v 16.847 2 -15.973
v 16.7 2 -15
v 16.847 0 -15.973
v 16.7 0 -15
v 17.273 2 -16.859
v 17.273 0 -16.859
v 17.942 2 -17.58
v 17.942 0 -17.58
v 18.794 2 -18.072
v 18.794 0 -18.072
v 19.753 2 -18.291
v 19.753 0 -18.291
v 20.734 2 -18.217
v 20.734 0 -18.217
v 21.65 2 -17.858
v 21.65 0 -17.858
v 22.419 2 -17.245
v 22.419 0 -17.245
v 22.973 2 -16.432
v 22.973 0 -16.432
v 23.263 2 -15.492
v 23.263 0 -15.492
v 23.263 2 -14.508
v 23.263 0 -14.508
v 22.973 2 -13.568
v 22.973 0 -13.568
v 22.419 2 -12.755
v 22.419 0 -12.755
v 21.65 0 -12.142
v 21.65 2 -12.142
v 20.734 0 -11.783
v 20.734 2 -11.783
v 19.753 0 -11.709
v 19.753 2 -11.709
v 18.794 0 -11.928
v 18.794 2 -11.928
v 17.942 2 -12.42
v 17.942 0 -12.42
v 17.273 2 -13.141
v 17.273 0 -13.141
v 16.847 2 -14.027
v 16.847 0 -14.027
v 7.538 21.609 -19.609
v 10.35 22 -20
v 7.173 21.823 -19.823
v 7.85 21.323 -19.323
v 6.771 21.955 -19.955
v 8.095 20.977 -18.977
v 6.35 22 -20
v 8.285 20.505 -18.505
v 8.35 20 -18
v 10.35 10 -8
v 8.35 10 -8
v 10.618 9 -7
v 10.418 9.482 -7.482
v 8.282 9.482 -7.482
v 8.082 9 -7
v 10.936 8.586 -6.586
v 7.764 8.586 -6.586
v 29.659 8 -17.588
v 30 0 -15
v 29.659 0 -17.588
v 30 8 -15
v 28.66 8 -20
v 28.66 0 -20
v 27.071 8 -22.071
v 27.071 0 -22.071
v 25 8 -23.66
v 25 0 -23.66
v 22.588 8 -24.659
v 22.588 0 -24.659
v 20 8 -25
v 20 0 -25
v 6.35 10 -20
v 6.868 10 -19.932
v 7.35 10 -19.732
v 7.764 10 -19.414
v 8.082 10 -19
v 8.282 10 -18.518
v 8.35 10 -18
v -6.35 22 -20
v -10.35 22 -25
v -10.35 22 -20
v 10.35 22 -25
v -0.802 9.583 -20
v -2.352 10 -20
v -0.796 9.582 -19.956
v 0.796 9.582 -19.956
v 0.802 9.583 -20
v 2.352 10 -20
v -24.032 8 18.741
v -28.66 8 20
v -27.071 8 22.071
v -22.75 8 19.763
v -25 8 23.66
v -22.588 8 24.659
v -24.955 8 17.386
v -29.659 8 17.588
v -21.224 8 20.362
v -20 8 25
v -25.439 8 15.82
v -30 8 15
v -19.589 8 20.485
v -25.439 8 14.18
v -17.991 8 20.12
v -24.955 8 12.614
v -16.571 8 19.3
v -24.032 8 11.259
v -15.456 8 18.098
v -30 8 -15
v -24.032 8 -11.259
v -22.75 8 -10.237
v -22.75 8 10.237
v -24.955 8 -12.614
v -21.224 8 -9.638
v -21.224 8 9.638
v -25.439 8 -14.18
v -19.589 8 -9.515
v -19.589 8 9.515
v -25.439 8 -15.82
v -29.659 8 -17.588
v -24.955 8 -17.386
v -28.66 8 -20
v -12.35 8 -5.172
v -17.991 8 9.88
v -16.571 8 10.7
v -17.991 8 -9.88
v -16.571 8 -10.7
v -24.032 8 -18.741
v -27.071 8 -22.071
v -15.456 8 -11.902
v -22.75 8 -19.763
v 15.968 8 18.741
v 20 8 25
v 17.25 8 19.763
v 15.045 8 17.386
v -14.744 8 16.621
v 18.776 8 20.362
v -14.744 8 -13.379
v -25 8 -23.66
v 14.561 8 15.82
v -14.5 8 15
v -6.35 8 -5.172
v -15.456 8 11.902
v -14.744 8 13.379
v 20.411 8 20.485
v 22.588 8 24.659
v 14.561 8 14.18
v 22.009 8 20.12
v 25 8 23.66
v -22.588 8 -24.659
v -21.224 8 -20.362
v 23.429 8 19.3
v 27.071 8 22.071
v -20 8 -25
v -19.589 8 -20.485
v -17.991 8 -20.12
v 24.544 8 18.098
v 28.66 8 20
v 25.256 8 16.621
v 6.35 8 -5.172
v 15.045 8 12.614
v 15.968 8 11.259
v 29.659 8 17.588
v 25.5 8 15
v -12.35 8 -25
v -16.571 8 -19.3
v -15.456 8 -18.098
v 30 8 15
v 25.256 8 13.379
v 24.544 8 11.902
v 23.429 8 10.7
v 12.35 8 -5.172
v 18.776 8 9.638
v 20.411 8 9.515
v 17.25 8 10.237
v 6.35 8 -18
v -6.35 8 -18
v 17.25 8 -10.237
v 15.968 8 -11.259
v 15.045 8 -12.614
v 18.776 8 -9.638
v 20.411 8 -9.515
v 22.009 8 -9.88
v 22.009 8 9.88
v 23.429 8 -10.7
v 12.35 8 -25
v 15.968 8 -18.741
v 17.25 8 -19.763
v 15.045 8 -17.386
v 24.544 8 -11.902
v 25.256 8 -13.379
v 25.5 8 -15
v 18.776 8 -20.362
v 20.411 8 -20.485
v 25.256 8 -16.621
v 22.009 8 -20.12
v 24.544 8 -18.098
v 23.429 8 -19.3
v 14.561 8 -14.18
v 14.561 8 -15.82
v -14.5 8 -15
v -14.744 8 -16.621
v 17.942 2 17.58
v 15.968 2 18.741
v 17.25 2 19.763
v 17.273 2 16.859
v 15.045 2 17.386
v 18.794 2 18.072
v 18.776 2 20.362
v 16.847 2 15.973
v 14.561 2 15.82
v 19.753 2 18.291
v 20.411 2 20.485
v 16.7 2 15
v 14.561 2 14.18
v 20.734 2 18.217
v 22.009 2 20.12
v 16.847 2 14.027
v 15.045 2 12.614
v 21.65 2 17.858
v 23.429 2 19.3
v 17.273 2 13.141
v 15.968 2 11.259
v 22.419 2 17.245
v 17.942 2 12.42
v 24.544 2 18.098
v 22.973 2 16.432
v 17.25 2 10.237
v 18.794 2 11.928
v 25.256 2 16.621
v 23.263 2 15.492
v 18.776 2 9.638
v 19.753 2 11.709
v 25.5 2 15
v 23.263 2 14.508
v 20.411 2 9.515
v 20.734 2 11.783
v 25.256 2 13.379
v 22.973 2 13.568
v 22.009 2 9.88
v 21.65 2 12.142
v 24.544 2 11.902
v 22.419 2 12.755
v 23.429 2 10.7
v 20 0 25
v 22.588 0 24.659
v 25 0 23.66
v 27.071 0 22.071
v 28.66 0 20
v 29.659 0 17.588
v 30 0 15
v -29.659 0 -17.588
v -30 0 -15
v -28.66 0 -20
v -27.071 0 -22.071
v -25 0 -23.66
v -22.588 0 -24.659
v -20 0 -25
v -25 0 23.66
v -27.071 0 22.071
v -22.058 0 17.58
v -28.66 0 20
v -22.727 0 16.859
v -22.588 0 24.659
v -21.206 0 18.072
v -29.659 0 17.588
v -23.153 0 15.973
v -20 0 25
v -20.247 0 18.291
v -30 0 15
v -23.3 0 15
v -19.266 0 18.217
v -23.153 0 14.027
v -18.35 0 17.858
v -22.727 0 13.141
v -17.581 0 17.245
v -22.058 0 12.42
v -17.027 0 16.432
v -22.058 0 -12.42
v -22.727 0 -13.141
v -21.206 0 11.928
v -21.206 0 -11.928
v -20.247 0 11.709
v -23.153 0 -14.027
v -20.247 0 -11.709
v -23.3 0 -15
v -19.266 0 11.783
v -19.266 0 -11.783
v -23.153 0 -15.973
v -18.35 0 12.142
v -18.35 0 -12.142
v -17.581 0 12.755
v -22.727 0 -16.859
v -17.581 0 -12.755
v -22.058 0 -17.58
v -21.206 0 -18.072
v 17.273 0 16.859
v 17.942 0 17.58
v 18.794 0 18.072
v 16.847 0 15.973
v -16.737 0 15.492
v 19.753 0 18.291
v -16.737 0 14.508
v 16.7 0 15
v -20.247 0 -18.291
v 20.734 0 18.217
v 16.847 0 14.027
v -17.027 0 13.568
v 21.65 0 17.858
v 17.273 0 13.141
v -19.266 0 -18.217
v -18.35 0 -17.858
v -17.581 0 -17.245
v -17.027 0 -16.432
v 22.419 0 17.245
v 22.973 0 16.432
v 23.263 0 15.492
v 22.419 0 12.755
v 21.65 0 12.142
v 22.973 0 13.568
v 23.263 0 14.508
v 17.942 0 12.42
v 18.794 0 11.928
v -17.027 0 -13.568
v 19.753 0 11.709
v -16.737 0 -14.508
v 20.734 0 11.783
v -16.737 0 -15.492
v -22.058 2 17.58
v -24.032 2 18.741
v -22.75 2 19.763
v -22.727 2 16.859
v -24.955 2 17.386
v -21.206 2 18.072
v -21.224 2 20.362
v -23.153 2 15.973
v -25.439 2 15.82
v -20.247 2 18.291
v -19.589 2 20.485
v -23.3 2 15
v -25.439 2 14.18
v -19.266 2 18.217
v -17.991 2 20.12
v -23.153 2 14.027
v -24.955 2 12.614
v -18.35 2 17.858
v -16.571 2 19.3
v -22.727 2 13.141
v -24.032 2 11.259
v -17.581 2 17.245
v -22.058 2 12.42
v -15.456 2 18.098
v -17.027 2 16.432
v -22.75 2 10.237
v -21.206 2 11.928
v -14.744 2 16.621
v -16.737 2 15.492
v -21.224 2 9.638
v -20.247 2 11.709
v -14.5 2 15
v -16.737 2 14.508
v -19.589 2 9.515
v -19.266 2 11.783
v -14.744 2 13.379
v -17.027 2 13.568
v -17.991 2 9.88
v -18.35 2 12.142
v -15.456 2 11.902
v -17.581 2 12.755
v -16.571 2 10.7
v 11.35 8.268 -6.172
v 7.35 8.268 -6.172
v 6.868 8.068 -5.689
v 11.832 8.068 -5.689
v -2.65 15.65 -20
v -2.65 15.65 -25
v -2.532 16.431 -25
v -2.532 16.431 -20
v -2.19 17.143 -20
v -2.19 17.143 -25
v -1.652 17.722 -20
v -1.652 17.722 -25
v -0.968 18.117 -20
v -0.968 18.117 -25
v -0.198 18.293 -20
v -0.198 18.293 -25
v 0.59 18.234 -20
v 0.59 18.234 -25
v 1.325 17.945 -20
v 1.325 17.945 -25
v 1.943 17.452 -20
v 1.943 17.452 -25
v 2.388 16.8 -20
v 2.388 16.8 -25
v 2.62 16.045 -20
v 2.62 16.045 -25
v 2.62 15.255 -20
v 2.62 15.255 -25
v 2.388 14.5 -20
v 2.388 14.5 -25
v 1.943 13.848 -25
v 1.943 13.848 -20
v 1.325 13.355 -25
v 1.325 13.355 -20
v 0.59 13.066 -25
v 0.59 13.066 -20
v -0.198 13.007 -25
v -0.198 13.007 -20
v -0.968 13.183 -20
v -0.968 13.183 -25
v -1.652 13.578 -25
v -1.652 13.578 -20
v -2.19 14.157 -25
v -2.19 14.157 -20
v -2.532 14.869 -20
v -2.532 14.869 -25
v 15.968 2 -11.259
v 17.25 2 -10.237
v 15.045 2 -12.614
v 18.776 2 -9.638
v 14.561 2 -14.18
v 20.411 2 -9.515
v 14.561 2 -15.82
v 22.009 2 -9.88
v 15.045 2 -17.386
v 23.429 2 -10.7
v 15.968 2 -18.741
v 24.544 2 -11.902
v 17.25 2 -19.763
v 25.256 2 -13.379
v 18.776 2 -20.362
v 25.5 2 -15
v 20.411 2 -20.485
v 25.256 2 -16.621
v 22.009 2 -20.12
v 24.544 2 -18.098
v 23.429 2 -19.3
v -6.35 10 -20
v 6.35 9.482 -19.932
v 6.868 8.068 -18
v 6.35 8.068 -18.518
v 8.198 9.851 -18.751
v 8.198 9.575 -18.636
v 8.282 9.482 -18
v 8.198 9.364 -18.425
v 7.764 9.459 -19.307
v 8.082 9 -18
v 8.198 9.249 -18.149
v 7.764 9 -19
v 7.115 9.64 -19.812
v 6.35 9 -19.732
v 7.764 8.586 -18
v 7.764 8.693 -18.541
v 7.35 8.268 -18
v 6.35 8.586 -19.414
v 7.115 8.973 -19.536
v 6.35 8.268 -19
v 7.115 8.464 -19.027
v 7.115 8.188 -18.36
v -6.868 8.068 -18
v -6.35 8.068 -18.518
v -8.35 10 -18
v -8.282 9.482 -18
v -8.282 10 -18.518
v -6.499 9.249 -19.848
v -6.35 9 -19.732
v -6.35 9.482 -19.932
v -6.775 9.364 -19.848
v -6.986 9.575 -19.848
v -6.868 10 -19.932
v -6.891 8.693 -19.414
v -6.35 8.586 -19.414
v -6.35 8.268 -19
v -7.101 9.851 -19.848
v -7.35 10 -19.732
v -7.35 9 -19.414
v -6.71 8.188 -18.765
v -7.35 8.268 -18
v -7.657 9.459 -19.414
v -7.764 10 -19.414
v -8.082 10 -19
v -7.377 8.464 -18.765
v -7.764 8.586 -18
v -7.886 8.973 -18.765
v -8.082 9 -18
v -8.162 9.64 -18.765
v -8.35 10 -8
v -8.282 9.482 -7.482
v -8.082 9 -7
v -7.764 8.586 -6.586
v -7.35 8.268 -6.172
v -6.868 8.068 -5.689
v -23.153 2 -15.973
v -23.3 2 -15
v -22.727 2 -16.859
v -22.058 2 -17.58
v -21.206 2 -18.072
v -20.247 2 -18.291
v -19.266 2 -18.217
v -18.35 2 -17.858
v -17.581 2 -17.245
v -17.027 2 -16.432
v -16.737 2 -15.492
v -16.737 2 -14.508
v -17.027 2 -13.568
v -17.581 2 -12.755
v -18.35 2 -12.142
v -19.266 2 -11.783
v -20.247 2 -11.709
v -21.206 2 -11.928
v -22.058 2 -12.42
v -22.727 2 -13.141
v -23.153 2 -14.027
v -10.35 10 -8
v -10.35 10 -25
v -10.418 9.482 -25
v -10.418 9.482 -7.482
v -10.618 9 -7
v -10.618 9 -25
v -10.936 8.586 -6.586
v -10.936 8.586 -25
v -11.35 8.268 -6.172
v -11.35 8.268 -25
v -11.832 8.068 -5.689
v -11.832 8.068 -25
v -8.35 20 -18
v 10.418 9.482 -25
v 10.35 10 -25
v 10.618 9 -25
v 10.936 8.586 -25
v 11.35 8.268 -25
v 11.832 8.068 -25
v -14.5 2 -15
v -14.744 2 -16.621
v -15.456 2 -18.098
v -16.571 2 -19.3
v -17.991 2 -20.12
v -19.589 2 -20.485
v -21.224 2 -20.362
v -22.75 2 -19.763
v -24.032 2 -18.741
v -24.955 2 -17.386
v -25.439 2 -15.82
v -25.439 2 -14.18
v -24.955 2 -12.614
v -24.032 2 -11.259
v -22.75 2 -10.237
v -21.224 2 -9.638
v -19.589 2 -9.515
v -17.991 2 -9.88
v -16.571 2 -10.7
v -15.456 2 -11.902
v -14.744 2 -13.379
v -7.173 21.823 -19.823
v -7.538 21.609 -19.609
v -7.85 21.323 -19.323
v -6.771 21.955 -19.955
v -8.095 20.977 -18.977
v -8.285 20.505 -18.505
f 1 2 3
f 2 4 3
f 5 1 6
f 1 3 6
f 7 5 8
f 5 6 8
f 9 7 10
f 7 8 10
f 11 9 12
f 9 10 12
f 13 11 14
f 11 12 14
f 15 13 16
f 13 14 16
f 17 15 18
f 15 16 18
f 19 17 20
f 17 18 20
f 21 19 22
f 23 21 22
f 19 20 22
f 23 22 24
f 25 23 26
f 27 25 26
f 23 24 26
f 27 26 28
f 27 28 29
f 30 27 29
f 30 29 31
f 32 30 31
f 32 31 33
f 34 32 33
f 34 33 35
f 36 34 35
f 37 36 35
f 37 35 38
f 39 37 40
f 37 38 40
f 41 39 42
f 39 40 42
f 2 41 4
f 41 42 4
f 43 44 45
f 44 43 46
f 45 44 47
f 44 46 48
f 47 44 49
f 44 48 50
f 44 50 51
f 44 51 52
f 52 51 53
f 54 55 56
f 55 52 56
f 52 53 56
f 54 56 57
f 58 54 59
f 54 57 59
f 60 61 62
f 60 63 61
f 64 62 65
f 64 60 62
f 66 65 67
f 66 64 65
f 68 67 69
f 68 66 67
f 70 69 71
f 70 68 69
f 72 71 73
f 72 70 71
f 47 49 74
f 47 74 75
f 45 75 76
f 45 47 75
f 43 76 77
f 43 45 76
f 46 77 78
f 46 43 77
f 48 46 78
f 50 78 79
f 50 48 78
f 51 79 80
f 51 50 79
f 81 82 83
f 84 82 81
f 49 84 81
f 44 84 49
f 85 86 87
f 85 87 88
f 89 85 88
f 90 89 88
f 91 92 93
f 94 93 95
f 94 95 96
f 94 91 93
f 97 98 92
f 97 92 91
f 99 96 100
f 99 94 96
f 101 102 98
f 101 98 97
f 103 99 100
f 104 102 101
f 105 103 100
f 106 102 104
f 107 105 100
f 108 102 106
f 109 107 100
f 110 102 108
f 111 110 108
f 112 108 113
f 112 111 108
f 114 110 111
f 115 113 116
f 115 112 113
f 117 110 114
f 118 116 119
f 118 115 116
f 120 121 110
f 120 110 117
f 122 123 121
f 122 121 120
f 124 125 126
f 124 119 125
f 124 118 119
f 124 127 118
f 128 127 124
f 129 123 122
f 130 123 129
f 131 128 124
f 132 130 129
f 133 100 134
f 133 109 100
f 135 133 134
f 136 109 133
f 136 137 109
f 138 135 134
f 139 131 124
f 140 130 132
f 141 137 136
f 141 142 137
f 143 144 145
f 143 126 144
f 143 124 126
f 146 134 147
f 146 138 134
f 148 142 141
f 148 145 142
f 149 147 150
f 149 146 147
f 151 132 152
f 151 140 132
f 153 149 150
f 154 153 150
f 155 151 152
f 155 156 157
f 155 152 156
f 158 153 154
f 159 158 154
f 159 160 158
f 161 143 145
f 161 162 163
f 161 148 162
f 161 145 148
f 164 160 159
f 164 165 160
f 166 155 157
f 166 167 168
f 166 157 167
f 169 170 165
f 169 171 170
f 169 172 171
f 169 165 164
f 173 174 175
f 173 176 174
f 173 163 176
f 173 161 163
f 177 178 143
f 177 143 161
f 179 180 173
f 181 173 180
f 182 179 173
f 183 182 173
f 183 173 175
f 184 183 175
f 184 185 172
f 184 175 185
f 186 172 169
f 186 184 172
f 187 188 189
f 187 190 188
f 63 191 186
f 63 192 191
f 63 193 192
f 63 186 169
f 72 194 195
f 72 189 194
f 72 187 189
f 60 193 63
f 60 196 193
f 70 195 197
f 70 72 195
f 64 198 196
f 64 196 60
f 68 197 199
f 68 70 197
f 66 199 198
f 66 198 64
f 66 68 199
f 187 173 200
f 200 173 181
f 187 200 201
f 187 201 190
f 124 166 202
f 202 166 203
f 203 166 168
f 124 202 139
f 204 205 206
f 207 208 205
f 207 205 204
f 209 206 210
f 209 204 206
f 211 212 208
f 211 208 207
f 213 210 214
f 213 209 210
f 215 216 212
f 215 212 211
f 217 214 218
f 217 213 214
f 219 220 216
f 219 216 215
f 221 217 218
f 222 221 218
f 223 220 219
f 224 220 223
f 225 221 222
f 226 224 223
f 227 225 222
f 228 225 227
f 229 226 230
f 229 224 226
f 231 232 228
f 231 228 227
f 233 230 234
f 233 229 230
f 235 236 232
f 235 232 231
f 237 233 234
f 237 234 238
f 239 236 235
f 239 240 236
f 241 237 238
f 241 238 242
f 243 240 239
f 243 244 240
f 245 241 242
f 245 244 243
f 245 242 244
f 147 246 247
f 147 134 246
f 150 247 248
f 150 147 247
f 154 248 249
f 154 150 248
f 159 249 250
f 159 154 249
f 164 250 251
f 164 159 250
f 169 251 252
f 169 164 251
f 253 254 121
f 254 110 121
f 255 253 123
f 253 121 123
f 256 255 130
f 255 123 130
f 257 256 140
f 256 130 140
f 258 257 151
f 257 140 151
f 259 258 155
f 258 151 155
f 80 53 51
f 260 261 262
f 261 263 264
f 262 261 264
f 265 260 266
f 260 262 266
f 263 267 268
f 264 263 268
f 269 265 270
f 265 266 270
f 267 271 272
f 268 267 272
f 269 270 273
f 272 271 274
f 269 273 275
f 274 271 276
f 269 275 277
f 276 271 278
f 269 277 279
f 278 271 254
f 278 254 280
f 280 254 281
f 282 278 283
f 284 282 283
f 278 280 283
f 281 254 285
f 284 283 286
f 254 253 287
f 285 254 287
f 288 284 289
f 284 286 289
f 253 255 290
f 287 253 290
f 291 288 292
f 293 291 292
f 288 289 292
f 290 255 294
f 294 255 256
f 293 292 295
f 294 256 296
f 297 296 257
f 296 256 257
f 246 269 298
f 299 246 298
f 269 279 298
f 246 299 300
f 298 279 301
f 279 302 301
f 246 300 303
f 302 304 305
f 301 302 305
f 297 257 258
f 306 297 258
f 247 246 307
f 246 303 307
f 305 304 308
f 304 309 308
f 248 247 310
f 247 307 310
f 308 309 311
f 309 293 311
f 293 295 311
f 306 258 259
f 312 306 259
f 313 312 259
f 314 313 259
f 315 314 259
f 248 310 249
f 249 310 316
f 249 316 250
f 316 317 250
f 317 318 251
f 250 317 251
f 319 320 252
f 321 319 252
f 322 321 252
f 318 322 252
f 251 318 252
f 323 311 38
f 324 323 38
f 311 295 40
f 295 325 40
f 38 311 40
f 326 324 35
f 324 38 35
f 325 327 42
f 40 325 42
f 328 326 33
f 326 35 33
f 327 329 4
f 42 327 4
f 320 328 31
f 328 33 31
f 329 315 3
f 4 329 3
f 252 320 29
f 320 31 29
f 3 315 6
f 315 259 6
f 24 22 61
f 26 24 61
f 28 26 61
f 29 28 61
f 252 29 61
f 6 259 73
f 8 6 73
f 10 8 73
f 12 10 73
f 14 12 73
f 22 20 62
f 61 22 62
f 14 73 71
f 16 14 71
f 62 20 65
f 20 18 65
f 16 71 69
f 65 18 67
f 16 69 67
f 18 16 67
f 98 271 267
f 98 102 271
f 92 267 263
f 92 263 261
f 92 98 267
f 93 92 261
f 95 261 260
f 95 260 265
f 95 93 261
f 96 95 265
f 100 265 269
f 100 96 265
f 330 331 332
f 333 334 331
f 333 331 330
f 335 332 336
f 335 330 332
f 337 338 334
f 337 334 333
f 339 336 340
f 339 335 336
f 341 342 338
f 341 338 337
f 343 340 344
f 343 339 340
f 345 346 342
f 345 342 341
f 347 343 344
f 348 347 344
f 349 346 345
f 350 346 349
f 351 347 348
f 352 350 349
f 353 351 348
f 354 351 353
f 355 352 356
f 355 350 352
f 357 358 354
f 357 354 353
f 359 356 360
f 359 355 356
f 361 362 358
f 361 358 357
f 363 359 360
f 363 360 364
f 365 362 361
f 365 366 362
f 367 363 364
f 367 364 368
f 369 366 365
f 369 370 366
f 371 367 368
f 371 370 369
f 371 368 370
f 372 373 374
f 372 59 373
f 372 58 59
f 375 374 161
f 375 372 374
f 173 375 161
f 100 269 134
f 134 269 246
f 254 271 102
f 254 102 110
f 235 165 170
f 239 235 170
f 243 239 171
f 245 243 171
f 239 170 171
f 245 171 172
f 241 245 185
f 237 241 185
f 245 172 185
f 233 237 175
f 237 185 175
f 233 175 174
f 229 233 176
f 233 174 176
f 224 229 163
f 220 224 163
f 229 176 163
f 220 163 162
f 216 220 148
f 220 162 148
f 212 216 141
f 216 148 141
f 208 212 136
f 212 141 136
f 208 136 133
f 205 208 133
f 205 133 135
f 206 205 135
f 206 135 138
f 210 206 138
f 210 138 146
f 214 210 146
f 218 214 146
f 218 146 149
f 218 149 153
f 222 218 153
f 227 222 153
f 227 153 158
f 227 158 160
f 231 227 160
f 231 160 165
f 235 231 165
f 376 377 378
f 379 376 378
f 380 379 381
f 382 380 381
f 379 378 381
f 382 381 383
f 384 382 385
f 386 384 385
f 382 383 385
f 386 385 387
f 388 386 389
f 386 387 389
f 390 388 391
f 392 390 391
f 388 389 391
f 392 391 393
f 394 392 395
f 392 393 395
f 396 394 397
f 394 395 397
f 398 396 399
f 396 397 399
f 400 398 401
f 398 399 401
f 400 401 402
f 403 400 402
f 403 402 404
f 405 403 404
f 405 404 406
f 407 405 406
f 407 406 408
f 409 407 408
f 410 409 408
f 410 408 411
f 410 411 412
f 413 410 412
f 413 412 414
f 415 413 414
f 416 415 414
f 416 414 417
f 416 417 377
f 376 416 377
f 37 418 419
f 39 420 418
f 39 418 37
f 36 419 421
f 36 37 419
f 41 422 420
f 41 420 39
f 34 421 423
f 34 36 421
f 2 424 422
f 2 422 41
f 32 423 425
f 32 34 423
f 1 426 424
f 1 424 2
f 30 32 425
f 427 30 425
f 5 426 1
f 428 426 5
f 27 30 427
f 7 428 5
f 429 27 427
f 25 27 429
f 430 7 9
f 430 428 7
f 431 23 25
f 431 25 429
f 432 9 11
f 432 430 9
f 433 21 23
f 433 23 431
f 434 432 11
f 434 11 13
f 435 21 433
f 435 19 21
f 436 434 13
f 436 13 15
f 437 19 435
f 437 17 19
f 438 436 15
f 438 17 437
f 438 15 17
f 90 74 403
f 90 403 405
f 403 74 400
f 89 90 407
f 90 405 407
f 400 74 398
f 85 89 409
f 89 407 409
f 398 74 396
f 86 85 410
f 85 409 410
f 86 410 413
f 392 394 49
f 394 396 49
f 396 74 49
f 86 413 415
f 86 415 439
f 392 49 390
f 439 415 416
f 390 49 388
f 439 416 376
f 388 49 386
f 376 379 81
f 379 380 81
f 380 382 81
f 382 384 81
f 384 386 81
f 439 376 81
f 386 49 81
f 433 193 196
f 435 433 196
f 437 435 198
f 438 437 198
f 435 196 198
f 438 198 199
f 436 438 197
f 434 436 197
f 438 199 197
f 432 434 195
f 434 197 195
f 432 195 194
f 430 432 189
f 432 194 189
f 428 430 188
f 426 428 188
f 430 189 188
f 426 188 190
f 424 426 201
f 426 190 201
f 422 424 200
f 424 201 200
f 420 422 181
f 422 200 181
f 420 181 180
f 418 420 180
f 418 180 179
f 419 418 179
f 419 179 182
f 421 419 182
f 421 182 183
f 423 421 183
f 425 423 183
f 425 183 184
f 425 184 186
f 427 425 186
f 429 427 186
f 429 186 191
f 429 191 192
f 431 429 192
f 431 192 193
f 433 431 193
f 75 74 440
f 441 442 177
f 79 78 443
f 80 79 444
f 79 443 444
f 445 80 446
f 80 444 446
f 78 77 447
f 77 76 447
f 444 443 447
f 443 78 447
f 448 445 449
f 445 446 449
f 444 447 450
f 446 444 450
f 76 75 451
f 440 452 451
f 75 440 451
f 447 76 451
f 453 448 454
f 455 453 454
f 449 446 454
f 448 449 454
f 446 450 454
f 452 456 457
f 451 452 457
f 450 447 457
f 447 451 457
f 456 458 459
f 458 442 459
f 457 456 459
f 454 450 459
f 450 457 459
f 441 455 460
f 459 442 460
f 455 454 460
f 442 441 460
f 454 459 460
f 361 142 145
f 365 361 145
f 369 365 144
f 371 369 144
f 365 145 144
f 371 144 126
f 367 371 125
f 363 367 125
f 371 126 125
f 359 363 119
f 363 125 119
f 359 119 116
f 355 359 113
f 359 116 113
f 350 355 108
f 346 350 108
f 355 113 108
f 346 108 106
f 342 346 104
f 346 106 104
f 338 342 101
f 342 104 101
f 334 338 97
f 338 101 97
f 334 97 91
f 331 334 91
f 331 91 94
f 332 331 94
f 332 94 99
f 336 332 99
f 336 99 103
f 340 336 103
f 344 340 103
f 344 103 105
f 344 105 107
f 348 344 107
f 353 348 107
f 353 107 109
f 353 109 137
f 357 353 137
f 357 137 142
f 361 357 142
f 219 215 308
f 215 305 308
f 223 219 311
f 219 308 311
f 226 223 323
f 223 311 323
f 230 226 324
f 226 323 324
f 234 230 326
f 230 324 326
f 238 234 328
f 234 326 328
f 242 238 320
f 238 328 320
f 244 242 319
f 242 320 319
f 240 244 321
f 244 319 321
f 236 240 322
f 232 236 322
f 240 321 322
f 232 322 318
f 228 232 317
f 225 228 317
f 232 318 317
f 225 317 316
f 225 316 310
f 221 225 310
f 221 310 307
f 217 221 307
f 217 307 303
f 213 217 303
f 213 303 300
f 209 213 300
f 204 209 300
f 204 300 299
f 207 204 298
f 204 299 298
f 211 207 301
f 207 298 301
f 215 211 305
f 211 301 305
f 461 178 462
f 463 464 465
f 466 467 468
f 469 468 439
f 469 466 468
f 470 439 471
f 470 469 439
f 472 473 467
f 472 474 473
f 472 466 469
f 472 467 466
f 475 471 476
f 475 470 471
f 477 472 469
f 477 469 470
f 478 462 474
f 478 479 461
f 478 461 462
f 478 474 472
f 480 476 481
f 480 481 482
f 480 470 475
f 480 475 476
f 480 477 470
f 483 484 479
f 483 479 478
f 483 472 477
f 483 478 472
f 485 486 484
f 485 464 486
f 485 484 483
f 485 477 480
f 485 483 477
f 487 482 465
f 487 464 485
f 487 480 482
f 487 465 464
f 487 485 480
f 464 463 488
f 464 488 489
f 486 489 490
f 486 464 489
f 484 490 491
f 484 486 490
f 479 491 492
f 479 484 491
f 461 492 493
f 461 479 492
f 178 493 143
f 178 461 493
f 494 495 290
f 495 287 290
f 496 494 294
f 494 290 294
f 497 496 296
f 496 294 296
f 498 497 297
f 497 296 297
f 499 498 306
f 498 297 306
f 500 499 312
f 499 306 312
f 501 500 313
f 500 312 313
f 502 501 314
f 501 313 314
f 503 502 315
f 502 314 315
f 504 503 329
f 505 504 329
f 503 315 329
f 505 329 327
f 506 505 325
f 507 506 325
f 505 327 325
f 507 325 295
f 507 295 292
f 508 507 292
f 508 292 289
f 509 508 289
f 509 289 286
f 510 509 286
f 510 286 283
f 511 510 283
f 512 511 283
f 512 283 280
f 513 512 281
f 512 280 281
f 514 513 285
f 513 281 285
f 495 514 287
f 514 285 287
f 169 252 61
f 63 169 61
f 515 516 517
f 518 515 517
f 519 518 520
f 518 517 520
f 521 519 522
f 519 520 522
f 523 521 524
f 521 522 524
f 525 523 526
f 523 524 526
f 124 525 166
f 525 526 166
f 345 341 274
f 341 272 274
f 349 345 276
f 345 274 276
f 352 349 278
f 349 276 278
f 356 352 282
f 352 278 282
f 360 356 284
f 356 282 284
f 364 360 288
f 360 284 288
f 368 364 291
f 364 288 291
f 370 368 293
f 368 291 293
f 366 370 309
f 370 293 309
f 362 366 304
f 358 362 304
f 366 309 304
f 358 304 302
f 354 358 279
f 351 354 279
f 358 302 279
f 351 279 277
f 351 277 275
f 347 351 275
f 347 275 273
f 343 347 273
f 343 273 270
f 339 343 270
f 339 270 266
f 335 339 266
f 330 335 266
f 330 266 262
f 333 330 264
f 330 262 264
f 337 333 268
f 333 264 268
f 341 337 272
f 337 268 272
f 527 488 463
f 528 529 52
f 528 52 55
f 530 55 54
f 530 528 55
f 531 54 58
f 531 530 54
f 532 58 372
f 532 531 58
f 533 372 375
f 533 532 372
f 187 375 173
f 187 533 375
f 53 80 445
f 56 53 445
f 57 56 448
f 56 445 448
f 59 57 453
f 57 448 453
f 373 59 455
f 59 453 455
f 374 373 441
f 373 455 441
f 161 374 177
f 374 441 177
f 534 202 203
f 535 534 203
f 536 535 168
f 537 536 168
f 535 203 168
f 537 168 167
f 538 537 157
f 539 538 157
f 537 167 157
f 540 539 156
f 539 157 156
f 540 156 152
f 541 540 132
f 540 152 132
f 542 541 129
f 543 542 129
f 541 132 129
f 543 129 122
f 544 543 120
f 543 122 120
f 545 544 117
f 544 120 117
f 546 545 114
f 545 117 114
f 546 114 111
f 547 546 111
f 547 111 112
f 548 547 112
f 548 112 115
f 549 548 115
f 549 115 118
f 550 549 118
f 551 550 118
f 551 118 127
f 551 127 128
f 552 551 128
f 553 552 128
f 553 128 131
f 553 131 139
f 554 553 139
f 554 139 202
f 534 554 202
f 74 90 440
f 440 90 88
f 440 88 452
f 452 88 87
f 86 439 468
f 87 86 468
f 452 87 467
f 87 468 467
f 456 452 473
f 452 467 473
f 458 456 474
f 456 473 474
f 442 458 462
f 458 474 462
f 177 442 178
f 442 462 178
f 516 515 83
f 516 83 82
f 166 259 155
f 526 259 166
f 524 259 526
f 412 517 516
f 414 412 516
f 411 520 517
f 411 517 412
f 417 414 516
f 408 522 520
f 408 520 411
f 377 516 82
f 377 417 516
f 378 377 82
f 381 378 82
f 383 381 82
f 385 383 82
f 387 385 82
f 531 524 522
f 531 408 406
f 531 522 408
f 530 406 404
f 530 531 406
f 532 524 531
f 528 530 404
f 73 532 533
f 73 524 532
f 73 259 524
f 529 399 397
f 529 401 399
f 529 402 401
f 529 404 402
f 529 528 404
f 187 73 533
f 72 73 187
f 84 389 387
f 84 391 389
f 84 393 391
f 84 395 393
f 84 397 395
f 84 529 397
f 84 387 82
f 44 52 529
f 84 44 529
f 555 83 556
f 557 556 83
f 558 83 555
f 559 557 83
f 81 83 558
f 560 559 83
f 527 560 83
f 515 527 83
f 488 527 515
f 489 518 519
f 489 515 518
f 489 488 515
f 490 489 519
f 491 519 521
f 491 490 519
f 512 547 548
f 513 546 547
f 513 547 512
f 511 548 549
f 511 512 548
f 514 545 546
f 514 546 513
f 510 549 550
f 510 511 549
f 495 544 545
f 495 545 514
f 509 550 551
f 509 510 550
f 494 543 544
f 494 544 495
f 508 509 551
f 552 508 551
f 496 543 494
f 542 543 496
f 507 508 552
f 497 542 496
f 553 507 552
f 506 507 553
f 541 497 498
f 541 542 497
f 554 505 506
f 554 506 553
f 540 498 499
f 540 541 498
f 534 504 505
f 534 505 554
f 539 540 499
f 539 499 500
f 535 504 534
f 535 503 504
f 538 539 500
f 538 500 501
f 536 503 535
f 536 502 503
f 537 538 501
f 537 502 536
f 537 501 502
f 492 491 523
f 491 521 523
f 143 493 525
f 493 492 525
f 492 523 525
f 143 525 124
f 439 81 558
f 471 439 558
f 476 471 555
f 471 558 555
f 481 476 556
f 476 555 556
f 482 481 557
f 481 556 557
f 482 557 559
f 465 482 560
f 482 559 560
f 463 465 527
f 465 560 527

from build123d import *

# Parameters (mm, degrees)
SKETCH1_W                      = 60
SKETCH1_H                      = 50
BOSS_EXTRUDE1_DEPTH            = 8
FILLET1_R                      = 10
CBORE_FOR_M6_SHCS1_D           = 6.6
CBORE_FOR_M6_SHCS1_DEPTH       = 10.1
CBORE_FOR_M6_SHCS1_CBORE_D     = 11
CBORE_FOR_M6_SHCS1_CBORE_DEPTH = 6
CBORE_FOR_M6_SHCS1_TIP         = 1.982840043
SKETCH4_W                      = 16.7
SKETCH4_H                      = 14
BOSS_EXTRUDE2_DEPTH            = 5
M5_CLEARANCE_HOLE1_D           = 5.3
M5_CLEARANCE_HOLE1_DEPTH       = 10
M5_CLEARANCE_HOLE1_TIP         = 1.59228064
BOSS_EXTRUDE3_DEPTH            = 2
FILLET2_R                      = 2
SKETCH8_R                      = 6.12
CUT_EXTRUDE1_DEPTH             = 59.386642308


with BuildPart() as part:
    # Sketch1 → Boss-Extrude1 (new body)
    with BuildSketch(Plane(origin=(0, 0, 0), x_dir=(1, 0, 0), z_dir=(0, 1, 0))):
        Rectangle(SKETCH1_W, SKETCH1_H)
    extrude(amount=BOSS_EXTRUDE1_DEPTH)

    # Fillet1
    fillet1_edges = [part.edges().sort_by_distance(p)[0] for p in [
        (30, 4, 25),
        (-30, 4, 25),
        (-30, 4, -25),
        (30, 4, -25),
    ]]
    fillet(fillet1_edges, radius=FILLET1_R)

    # CBORE for M6 SHCS1
    with Locations(Plane(origin=(0, 8, 0), x_dir=(1, 0, 0), z_dir=(0, 1, 0))):
        with Locations((-20, 15), (-20, -15), (20, -15), (20, 15)):
            CounterBoreHole(CBORE_FOR_M6_SHCS1_D / 2, CBORE_FOR_M6_SHCS1_CBORE_D / 2, CBORE_FOR_M6_SHCS1_CBORE_DEPTH, depth=CBORE_FOR_M6_SHCS1_DEPTH)
            with Locations((0, 0, -(CBORE_FOR_M6_SHCS1_DEPTH + CBORE_FOR_M6_SHCS1_TIP / 2))):  # 118° drill point
                Cone(0, CBORE_FOR_M6_SHCS1_D / 2, CBORE_FOR_M6_SHCS1_TIP, mode=Mode.SUBTRACT)

    # Sketch4 → Boss-Extrude2 (add)
    with BuildSketch(Plane(origin=(0, 0, -25), x_dir=(-1, 0, 0), z_dir=(0, 0, -1))):
        with Locations((0, 15)):
            Rectangle(SKETCH4_W, SKETCH4_H)
    extrude(amount=-BOSS_EXTRUDE2_DEPTH)

    # M5 Clearance Hole1
    with Locations(Plane.XY.offset(-20)):
        with Locations((0, 15.65)):
            Hole(M5_CLEARANCE_HOLE1_D / 2, depth=M5_CLEARANCE_HOLE1_DEPTH)
            with Locations((0, 0, -(M5_CLEARANCE_HOLE1_DEPTH + M5_CLEARANCE_HOLE1_TIP / 2))):  # 118° drill point
                Cone(0, M5_CLEARANCE_HOLE1_D / 2, M5_CLEARANCE_HOLE1_TIP, mode=Mode.SUBTRACT)

    # Sketch7 → Boss-Extrude3 (add)
    with BuildSketch(Plane(origin=(8.35, 0, 0), x_dir=(0, 0, -1), z_dir=(1, 0, 0))):
        Polygon((20, 22), (6, 8), (25, 8), (25, 22), align=None)
    boss_extrude3 = extrude(amount=BOSS_EXTRUDE3_DEPTH)

    # Mirror1: Boss-Extrude3 across plane
    add(boss_extrude3.mirror(Plane(origin=(0, 0, 0), x_dir=(0, 0, 1), z_dir=(1, 0, 0))))

    # Fillet2
    fillet2_edges = [part.edges().sort_by_distance(p)[0] for p in [
        (-10.35, 8, -15.5),
        (-9.35, 8, -6),
        (-8.35, 8, -13),
        (0, 8, -20),
        (8.35, 15, -20),
        (-8.35, 15, -20),
        (8.35, 8, -13),
        (9.35, 8, -6),
        (10.35, 8, -15.5),
    ]]
    fillet(fillet2_edges, radius=FILLET2_R)

    # Sketch8 → Cut-Extrude1 (cut, through all)
    with BuildSketch(Plane.XY.offset(-20)):
        with Locations((0, 15.65)):
            Circle(SKETCH8_R)
    extrude(amount=CUT_EXTRUDE1_DEPTH, mode=Mode.SUBTRACT)


solid = part.part
